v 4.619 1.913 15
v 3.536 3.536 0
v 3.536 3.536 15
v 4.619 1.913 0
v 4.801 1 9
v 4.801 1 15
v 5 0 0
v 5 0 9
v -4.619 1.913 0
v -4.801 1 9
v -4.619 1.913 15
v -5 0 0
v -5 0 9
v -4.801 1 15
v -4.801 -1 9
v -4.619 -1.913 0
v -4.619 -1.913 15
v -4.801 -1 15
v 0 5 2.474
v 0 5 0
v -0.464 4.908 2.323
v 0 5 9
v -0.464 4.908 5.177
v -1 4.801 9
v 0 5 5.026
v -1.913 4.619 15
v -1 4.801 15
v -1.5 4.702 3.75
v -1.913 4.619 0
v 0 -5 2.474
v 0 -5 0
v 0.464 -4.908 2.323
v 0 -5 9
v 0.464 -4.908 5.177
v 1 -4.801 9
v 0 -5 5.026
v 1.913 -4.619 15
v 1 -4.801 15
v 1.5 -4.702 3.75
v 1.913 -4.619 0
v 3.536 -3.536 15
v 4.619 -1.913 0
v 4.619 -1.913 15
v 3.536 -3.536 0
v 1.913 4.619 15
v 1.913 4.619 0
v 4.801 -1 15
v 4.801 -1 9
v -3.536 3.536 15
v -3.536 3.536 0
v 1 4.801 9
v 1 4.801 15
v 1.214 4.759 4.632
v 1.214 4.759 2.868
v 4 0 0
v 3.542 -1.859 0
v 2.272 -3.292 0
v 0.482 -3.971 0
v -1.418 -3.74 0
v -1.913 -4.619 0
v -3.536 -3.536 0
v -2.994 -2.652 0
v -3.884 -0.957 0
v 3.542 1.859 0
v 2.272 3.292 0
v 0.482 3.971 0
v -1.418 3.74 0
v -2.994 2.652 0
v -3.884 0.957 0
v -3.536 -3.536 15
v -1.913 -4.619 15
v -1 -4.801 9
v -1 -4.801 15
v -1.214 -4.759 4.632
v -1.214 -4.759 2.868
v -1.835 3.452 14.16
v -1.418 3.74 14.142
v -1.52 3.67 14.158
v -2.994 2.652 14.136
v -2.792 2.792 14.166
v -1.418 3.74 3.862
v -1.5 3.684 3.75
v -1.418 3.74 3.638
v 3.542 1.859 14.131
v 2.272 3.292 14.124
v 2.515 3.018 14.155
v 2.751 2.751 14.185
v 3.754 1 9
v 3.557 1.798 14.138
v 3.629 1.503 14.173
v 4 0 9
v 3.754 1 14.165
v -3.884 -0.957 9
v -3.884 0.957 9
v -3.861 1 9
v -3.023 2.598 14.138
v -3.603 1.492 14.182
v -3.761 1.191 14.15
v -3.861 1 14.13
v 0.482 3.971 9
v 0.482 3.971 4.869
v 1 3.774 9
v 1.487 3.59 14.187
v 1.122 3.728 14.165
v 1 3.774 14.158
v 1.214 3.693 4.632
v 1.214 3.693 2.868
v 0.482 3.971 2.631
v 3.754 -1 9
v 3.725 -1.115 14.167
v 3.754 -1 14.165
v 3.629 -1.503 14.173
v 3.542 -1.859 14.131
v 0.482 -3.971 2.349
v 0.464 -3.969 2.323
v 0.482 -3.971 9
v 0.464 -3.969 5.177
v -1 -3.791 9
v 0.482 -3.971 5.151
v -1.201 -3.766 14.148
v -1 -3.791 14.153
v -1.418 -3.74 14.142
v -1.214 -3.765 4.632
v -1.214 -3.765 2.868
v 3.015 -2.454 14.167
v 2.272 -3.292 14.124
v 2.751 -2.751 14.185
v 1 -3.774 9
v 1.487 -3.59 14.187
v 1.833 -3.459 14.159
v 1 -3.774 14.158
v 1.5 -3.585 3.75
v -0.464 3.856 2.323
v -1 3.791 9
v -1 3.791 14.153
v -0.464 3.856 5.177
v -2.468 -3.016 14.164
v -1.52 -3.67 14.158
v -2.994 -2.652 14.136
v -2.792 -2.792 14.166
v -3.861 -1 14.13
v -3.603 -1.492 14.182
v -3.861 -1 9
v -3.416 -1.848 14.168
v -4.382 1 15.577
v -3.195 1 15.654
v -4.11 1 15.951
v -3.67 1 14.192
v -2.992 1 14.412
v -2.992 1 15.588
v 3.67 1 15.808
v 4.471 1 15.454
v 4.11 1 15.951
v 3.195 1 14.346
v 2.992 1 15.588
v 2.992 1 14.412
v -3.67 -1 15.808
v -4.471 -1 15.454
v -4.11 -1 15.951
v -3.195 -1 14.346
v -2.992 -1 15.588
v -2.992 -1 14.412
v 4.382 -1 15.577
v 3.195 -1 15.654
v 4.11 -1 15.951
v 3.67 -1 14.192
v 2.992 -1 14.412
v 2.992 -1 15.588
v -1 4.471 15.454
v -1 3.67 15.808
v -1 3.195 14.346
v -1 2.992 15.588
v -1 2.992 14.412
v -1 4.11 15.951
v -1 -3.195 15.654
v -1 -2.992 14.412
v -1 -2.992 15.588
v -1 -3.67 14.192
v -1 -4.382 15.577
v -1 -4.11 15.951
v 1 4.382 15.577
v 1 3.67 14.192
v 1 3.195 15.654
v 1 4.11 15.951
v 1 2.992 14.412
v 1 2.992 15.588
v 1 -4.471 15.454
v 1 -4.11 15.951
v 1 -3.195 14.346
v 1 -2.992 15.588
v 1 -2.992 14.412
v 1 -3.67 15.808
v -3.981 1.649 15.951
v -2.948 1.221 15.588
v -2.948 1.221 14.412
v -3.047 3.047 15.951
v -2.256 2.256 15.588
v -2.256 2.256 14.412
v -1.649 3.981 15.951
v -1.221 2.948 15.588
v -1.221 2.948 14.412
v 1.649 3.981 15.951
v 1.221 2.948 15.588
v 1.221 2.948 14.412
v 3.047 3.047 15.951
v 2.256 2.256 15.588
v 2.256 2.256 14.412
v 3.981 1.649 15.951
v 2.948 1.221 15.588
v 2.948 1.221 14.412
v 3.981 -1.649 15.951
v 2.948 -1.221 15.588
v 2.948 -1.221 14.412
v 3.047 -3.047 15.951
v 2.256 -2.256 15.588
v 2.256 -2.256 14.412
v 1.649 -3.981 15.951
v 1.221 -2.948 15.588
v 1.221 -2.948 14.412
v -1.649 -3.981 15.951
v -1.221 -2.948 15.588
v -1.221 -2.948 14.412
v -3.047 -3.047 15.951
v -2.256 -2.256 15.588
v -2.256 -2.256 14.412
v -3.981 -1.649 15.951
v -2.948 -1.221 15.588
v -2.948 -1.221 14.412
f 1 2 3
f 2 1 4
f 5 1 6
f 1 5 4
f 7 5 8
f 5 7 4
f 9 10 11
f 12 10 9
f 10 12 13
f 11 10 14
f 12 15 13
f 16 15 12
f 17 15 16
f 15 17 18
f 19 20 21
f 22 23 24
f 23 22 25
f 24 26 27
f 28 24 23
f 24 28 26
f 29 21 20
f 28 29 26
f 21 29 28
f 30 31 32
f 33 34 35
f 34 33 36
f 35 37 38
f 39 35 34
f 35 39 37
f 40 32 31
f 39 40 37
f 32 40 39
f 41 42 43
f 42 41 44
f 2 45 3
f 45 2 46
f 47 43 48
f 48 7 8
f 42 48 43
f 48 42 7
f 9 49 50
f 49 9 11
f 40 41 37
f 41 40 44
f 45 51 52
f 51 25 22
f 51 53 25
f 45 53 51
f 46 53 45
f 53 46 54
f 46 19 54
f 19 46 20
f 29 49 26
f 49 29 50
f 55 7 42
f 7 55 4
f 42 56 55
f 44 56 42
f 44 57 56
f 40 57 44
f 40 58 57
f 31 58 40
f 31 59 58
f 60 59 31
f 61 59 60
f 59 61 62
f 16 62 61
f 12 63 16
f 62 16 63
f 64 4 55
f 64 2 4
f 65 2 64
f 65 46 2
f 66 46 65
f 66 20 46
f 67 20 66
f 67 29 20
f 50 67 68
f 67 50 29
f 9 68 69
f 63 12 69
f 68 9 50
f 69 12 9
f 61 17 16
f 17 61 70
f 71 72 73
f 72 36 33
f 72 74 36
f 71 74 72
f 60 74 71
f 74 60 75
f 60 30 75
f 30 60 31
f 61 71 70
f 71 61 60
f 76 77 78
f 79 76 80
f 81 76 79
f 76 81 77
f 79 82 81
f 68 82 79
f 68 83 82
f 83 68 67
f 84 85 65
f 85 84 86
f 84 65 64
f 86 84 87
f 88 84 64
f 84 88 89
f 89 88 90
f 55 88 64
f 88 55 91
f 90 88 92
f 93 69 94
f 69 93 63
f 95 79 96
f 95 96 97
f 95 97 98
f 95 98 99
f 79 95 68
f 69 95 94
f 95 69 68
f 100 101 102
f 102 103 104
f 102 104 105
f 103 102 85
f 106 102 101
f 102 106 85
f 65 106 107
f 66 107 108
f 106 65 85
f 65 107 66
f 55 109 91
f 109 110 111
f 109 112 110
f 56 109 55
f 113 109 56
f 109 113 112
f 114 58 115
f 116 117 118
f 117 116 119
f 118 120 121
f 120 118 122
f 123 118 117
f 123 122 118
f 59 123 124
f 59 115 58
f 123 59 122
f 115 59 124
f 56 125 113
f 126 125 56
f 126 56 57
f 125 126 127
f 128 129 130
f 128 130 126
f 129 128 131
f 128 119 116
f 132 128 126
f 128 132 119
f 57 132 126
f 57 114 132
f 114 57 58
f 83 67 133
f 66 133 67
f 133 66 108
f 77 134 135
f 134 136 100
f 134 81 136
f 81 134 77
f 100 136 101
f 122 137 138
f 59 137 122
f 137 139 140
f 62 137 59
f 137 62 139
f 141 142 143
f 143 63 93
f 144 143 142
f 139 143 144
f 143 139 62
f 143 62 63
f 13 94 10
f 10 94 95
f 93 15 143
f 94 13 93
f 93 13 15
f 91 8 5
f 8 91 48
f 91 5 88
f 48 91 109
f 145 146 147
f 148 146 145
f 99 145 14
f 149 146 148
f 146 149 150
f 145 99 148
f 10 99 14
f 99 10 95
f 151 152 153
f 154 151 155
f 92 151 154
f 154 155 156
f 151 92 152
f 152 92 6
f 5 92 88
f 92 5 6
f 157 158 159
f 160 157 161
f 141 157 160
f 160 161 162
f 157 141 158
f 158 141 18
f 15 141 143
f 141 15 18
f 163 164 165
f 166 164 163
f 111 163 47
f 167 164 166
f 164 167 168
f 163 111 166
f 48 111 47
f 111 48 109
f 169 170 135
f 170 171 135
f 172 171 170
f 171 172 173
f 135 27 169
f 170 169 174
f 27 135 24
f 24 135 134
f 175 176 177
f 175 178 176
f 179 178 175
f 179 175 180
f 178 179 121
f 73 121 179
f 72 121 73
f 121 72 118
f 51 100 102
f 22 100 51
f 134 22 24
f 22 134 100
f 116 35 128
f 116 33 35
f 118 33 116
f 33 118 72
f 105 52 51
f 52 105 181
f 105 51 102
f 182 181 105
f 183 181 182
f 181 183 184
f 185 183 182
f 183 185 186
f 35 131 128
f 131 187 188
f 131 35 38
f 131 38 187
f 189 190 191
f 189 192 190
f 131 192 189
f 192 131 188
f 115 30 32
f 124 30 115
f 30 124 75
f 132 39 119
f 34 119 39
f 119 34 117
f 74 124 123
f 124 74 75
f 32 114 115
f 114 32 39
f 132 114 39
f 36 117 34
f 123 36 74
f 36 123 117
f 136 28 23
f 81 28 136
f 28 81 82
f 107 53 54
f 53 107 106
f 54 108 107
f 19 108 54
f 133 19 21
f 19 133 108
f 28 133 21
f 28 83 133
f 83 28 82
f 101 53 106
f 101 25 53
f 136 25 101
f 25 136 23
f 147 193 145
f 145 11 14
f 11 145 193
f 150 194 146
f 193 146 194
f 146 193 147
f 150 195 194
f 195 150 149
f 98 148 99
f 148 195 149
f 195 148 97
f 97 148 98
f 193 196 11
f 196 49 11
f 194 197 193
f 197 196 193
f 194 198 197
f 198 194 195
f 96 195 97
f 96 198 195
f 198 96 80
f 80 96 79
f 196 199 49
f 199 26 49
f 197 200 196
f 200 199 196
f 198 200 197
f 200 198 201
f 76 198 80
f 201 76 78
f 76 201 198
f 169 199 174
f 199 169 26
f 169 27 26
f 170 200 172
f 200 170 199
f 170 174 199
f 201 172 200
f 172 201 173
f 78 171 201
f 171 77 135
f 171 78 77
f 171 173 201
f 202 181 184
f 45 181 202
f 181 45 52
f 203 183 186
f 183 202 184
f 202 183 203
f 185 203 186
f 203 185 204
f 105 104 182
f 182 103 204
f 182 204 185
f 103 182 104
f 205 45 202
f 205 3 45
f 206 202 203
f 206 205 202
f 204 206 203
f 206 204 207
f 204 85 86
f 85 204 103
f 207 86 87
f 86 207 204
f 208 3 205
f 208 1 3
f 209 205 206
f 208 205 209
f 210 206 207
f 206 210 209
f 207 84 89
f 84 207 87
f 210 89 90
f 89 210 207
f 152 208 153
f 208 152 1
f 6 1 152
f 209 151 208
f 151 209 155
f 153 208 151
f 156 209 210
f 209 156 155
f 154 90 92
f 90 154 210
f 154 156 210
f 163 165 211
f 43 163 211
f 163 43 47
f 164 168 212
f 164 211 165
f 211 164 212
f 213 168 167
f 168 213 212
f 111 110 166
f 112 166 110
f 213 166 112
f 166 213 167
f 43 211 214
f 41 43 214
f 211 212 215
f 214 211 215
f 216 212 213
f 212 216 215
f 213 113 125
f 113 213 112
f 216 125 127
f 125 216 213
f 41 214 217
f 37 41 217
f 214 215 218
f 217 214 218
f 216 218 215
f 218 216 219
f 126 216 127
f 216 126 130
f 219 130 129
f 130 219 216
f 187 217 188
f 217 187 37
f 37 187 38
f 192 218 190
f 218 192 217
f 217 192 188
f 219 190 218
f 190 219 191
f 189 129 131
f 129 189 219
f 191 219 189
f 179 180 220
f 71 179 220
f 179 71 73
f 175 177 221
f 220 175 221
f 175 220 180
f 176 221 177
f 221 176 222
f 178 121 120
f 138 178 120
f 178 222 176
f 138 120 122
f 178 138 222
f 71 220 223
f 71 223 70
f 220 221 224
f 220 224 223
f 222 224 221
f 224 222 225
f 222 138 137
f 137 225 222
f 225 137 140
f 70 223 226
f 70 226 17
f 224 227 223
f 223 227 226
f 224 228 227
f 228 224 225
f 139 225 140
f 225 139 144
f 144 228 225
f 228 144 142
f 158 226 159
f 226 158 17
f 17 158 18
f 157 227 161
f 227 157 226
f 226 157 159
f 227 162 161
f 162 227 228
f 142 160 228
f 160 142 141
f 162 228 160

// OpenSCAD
VERSION = "MARK 4";
LASER_DIAMETER = 8; // actual: 6
LASER_LENGTH = 15; // actual: 14
BEAM_SPACING = 90;
SCREW_DIAMETER = 3;
WALL = 2;

rotate([0,0,0]){
    
    difference(){

        // post
        cylinder(r = (LASER_DIAMETER + WALL) / 2, h=LASER_LENGTH);
        
        // feed-through hole
        translate([0,0,-1]){
            cylinder(r = (LASER_DIAMETER / 2), h=LASER_LENGTH + 2);
        }
        
        // tension cut-outs
        translate([-LASER_DIAMETER,-WALL + (WALL / 2), LASER_LENGTH - (WALL * 3)]){
            cube([LASER_DIAMETER * 2, WALL, WALL * 4]);
        }
        rotate([0,0,90]){
            translate([-LASER_DIAMETER,-WALL + (WALL / 2), LASER_LENGTH - (WALL * 3)]){
                cube([LASER_DIAMETER * 2, WALL, WALL * 4]);
            }
        }
        
        // wiring hole
        translate([0,-WALL,(LASER_LENGTH / 4)]){
            rotate([90, 0, 0]){
                cylinder(r=SCREW_DIAMETER / 2, h=WALL * 2);
            }
        }
        
        // wiring hole
        rotate([0,0,180]){
            translate([0,-WALL,(LASER_LENGTH / 4)]){
                rotate([90, 0, 0]){
                    cylinder(r=SCREW_DIAMETER / 2, h=WALL * 2);
                }
            }
        } 
    }

    // top clip edge
    difference(){
            
        // top
        translate([0,0,LASER_LENGTH]){
            rotate_extrude(convexity = 10){
                translate([LASER_DIAMETER / 2, 0, 0]){
                    circle(r = 1);
                }
            }
        }
        
        // tension cut-outs (sloppy, we shouldn't have to repeat this here...
        translate([-LASER_DIAMETER,-WALL + (WALL / 2), LASER_LENGTH - (WALL * 3)]){
            cube([LASER_DIAMETER * 2, WALL, WALL * 4]);
        }
        rotate([0,0,90]){
            translate([-LASER_DIAMETER,-WALL + (WALL / 2), LASER_LENGTH - (WALL * 3)]){
                cube([LASER_DIAMETER * 2, WALL, WALL * 4]);
            }
        }
    }
}




/*
$fn = 50;

difference(){
    
    // base
    cube([BEAM_SPACING / 2, LASER_DIAMETER * 2, WALL]);
    
    // mounting holes
    translate([BEAM_SPACING / 8, LASER_DIAMETER, -1]){
        cylinder(r=SCREW_DIAMETER / 2, h=6);
    }
    translate([(BEAM_SPACING / 2) - (BEAM_SPACING / 8), LASER_DIAMETER, -1]){
        cylinder(r=SCREW_DIAMETER / 2, h=6);
    }
    
    // spacing cut-outs
    translate([-1,LASER_DIAMETER/2,-1]){
        cube([BEAM_SPACING / 12, LASER_DIAMETER, WALL + 2]);
    }
    translate([(BEAM_SPACING / 2 ) - (BEAM_SPACING / 12) + 1,LASER_DIAMETER+ (LASER_DIAMETER/2),-1]){
        cube([BEAM_SPACING / 12, LASER_DIAMETER, WALL + 2]);
    }
    translate([(BEAM_SPACING / 2 ) - (BEAM_SPACING / 12) + 1,- (LASER_DIAMETER / 2),-1]){
        cube([BEAM_SPACING / 12, LASER_DIAMETER, WALL + 2]);
    }
    
    // laser insert hole
    translate([BEAM_SPACING / 4, LASER_DIAMETER, -1]){
        cylinder(r=LASER_DIAMETER / 2, h=6);
    }
    
    // version emblem
    translate([8,1,WALL-1]){
        rotate([0,0,0]){
            linear_extrude(5){
                text(VERSION, size=2);
            }
        }
    }
}

// laser holder
translate([BEAM_SPACING / 4, LASER_DIAMETER, WALL]){
    difference(){

        // post
        cylinder(r = (LASER_DIAMETER + WALL) / 2, h=LASER_LENGTH);
        
        // feed-through hole
        translate([0,0,-1]){
            cylinder(r = (LASER_DIAMETER / 2), h=LASER_LENGTH + 2);
        }
        
        // tension cut-outs
        translate([-LASER_DIAMETER,-WALL + (WALL / 2), LASER_LENGTH - (WALL * 3)]){
            cube([LASER_DIAMETER * 2, WALL, WALL * 4]);
        }
        rotate([0,0,90]){
            translate([-LASER_DIAMETER,-WALL + (WALL / 2), LASER_LENGTH - (WALL * 3)]){
                cube([LASER_DIAMETER * 2, WALL, WALL * 4]);
            }
        }
        
        // wiring hole
        translate([0,-WALL,(LASER_LENGTH / 4)]){
            rotate([90, 0, 0]){
                cylinder(r=SCREW_DIAMETER / 2, h=WALL * 2);
            }
        }
        
        // wiring hole
        rotate([0,0,180]){
            translate([0,-WALL,(LASER_LENGTH / 4)]){
                rotate([90, 0, 0]){
                    cylinder(r=SCREW_DIAMETER / 2, h=WALL * 2);
                }
            }
        } 
    }
    
    difference(){
        
        // top
        translate([0,0,LASER_LENGTH]){
            rotate_extrude(convexity = 10){
                translate([LASER_DIAMETER / 2, 0, 0]){
                    circle(r = 1);
                }
            }
        }
        
        // tension cut-outs (sloppy, we shouldn't have to repeat this here...
        translate([-LASER_DIAMETER,-WALL + (WALL / 2), LASER_LENGTH - (WALL * 3)]){
            cube([LASER_DIAMETER * 2, WALL, WALL * 4]);
        }
        rotate([0,0,90]){
            translate([-LASER_DIAMETER,-WALL + (WALL / 2), LASER_LENGTH - (WALL * 3)]){
                cube([LASER_DIAMETER * 2, WALL, WALL * 4]);
            }
        }
    }
}
*/
